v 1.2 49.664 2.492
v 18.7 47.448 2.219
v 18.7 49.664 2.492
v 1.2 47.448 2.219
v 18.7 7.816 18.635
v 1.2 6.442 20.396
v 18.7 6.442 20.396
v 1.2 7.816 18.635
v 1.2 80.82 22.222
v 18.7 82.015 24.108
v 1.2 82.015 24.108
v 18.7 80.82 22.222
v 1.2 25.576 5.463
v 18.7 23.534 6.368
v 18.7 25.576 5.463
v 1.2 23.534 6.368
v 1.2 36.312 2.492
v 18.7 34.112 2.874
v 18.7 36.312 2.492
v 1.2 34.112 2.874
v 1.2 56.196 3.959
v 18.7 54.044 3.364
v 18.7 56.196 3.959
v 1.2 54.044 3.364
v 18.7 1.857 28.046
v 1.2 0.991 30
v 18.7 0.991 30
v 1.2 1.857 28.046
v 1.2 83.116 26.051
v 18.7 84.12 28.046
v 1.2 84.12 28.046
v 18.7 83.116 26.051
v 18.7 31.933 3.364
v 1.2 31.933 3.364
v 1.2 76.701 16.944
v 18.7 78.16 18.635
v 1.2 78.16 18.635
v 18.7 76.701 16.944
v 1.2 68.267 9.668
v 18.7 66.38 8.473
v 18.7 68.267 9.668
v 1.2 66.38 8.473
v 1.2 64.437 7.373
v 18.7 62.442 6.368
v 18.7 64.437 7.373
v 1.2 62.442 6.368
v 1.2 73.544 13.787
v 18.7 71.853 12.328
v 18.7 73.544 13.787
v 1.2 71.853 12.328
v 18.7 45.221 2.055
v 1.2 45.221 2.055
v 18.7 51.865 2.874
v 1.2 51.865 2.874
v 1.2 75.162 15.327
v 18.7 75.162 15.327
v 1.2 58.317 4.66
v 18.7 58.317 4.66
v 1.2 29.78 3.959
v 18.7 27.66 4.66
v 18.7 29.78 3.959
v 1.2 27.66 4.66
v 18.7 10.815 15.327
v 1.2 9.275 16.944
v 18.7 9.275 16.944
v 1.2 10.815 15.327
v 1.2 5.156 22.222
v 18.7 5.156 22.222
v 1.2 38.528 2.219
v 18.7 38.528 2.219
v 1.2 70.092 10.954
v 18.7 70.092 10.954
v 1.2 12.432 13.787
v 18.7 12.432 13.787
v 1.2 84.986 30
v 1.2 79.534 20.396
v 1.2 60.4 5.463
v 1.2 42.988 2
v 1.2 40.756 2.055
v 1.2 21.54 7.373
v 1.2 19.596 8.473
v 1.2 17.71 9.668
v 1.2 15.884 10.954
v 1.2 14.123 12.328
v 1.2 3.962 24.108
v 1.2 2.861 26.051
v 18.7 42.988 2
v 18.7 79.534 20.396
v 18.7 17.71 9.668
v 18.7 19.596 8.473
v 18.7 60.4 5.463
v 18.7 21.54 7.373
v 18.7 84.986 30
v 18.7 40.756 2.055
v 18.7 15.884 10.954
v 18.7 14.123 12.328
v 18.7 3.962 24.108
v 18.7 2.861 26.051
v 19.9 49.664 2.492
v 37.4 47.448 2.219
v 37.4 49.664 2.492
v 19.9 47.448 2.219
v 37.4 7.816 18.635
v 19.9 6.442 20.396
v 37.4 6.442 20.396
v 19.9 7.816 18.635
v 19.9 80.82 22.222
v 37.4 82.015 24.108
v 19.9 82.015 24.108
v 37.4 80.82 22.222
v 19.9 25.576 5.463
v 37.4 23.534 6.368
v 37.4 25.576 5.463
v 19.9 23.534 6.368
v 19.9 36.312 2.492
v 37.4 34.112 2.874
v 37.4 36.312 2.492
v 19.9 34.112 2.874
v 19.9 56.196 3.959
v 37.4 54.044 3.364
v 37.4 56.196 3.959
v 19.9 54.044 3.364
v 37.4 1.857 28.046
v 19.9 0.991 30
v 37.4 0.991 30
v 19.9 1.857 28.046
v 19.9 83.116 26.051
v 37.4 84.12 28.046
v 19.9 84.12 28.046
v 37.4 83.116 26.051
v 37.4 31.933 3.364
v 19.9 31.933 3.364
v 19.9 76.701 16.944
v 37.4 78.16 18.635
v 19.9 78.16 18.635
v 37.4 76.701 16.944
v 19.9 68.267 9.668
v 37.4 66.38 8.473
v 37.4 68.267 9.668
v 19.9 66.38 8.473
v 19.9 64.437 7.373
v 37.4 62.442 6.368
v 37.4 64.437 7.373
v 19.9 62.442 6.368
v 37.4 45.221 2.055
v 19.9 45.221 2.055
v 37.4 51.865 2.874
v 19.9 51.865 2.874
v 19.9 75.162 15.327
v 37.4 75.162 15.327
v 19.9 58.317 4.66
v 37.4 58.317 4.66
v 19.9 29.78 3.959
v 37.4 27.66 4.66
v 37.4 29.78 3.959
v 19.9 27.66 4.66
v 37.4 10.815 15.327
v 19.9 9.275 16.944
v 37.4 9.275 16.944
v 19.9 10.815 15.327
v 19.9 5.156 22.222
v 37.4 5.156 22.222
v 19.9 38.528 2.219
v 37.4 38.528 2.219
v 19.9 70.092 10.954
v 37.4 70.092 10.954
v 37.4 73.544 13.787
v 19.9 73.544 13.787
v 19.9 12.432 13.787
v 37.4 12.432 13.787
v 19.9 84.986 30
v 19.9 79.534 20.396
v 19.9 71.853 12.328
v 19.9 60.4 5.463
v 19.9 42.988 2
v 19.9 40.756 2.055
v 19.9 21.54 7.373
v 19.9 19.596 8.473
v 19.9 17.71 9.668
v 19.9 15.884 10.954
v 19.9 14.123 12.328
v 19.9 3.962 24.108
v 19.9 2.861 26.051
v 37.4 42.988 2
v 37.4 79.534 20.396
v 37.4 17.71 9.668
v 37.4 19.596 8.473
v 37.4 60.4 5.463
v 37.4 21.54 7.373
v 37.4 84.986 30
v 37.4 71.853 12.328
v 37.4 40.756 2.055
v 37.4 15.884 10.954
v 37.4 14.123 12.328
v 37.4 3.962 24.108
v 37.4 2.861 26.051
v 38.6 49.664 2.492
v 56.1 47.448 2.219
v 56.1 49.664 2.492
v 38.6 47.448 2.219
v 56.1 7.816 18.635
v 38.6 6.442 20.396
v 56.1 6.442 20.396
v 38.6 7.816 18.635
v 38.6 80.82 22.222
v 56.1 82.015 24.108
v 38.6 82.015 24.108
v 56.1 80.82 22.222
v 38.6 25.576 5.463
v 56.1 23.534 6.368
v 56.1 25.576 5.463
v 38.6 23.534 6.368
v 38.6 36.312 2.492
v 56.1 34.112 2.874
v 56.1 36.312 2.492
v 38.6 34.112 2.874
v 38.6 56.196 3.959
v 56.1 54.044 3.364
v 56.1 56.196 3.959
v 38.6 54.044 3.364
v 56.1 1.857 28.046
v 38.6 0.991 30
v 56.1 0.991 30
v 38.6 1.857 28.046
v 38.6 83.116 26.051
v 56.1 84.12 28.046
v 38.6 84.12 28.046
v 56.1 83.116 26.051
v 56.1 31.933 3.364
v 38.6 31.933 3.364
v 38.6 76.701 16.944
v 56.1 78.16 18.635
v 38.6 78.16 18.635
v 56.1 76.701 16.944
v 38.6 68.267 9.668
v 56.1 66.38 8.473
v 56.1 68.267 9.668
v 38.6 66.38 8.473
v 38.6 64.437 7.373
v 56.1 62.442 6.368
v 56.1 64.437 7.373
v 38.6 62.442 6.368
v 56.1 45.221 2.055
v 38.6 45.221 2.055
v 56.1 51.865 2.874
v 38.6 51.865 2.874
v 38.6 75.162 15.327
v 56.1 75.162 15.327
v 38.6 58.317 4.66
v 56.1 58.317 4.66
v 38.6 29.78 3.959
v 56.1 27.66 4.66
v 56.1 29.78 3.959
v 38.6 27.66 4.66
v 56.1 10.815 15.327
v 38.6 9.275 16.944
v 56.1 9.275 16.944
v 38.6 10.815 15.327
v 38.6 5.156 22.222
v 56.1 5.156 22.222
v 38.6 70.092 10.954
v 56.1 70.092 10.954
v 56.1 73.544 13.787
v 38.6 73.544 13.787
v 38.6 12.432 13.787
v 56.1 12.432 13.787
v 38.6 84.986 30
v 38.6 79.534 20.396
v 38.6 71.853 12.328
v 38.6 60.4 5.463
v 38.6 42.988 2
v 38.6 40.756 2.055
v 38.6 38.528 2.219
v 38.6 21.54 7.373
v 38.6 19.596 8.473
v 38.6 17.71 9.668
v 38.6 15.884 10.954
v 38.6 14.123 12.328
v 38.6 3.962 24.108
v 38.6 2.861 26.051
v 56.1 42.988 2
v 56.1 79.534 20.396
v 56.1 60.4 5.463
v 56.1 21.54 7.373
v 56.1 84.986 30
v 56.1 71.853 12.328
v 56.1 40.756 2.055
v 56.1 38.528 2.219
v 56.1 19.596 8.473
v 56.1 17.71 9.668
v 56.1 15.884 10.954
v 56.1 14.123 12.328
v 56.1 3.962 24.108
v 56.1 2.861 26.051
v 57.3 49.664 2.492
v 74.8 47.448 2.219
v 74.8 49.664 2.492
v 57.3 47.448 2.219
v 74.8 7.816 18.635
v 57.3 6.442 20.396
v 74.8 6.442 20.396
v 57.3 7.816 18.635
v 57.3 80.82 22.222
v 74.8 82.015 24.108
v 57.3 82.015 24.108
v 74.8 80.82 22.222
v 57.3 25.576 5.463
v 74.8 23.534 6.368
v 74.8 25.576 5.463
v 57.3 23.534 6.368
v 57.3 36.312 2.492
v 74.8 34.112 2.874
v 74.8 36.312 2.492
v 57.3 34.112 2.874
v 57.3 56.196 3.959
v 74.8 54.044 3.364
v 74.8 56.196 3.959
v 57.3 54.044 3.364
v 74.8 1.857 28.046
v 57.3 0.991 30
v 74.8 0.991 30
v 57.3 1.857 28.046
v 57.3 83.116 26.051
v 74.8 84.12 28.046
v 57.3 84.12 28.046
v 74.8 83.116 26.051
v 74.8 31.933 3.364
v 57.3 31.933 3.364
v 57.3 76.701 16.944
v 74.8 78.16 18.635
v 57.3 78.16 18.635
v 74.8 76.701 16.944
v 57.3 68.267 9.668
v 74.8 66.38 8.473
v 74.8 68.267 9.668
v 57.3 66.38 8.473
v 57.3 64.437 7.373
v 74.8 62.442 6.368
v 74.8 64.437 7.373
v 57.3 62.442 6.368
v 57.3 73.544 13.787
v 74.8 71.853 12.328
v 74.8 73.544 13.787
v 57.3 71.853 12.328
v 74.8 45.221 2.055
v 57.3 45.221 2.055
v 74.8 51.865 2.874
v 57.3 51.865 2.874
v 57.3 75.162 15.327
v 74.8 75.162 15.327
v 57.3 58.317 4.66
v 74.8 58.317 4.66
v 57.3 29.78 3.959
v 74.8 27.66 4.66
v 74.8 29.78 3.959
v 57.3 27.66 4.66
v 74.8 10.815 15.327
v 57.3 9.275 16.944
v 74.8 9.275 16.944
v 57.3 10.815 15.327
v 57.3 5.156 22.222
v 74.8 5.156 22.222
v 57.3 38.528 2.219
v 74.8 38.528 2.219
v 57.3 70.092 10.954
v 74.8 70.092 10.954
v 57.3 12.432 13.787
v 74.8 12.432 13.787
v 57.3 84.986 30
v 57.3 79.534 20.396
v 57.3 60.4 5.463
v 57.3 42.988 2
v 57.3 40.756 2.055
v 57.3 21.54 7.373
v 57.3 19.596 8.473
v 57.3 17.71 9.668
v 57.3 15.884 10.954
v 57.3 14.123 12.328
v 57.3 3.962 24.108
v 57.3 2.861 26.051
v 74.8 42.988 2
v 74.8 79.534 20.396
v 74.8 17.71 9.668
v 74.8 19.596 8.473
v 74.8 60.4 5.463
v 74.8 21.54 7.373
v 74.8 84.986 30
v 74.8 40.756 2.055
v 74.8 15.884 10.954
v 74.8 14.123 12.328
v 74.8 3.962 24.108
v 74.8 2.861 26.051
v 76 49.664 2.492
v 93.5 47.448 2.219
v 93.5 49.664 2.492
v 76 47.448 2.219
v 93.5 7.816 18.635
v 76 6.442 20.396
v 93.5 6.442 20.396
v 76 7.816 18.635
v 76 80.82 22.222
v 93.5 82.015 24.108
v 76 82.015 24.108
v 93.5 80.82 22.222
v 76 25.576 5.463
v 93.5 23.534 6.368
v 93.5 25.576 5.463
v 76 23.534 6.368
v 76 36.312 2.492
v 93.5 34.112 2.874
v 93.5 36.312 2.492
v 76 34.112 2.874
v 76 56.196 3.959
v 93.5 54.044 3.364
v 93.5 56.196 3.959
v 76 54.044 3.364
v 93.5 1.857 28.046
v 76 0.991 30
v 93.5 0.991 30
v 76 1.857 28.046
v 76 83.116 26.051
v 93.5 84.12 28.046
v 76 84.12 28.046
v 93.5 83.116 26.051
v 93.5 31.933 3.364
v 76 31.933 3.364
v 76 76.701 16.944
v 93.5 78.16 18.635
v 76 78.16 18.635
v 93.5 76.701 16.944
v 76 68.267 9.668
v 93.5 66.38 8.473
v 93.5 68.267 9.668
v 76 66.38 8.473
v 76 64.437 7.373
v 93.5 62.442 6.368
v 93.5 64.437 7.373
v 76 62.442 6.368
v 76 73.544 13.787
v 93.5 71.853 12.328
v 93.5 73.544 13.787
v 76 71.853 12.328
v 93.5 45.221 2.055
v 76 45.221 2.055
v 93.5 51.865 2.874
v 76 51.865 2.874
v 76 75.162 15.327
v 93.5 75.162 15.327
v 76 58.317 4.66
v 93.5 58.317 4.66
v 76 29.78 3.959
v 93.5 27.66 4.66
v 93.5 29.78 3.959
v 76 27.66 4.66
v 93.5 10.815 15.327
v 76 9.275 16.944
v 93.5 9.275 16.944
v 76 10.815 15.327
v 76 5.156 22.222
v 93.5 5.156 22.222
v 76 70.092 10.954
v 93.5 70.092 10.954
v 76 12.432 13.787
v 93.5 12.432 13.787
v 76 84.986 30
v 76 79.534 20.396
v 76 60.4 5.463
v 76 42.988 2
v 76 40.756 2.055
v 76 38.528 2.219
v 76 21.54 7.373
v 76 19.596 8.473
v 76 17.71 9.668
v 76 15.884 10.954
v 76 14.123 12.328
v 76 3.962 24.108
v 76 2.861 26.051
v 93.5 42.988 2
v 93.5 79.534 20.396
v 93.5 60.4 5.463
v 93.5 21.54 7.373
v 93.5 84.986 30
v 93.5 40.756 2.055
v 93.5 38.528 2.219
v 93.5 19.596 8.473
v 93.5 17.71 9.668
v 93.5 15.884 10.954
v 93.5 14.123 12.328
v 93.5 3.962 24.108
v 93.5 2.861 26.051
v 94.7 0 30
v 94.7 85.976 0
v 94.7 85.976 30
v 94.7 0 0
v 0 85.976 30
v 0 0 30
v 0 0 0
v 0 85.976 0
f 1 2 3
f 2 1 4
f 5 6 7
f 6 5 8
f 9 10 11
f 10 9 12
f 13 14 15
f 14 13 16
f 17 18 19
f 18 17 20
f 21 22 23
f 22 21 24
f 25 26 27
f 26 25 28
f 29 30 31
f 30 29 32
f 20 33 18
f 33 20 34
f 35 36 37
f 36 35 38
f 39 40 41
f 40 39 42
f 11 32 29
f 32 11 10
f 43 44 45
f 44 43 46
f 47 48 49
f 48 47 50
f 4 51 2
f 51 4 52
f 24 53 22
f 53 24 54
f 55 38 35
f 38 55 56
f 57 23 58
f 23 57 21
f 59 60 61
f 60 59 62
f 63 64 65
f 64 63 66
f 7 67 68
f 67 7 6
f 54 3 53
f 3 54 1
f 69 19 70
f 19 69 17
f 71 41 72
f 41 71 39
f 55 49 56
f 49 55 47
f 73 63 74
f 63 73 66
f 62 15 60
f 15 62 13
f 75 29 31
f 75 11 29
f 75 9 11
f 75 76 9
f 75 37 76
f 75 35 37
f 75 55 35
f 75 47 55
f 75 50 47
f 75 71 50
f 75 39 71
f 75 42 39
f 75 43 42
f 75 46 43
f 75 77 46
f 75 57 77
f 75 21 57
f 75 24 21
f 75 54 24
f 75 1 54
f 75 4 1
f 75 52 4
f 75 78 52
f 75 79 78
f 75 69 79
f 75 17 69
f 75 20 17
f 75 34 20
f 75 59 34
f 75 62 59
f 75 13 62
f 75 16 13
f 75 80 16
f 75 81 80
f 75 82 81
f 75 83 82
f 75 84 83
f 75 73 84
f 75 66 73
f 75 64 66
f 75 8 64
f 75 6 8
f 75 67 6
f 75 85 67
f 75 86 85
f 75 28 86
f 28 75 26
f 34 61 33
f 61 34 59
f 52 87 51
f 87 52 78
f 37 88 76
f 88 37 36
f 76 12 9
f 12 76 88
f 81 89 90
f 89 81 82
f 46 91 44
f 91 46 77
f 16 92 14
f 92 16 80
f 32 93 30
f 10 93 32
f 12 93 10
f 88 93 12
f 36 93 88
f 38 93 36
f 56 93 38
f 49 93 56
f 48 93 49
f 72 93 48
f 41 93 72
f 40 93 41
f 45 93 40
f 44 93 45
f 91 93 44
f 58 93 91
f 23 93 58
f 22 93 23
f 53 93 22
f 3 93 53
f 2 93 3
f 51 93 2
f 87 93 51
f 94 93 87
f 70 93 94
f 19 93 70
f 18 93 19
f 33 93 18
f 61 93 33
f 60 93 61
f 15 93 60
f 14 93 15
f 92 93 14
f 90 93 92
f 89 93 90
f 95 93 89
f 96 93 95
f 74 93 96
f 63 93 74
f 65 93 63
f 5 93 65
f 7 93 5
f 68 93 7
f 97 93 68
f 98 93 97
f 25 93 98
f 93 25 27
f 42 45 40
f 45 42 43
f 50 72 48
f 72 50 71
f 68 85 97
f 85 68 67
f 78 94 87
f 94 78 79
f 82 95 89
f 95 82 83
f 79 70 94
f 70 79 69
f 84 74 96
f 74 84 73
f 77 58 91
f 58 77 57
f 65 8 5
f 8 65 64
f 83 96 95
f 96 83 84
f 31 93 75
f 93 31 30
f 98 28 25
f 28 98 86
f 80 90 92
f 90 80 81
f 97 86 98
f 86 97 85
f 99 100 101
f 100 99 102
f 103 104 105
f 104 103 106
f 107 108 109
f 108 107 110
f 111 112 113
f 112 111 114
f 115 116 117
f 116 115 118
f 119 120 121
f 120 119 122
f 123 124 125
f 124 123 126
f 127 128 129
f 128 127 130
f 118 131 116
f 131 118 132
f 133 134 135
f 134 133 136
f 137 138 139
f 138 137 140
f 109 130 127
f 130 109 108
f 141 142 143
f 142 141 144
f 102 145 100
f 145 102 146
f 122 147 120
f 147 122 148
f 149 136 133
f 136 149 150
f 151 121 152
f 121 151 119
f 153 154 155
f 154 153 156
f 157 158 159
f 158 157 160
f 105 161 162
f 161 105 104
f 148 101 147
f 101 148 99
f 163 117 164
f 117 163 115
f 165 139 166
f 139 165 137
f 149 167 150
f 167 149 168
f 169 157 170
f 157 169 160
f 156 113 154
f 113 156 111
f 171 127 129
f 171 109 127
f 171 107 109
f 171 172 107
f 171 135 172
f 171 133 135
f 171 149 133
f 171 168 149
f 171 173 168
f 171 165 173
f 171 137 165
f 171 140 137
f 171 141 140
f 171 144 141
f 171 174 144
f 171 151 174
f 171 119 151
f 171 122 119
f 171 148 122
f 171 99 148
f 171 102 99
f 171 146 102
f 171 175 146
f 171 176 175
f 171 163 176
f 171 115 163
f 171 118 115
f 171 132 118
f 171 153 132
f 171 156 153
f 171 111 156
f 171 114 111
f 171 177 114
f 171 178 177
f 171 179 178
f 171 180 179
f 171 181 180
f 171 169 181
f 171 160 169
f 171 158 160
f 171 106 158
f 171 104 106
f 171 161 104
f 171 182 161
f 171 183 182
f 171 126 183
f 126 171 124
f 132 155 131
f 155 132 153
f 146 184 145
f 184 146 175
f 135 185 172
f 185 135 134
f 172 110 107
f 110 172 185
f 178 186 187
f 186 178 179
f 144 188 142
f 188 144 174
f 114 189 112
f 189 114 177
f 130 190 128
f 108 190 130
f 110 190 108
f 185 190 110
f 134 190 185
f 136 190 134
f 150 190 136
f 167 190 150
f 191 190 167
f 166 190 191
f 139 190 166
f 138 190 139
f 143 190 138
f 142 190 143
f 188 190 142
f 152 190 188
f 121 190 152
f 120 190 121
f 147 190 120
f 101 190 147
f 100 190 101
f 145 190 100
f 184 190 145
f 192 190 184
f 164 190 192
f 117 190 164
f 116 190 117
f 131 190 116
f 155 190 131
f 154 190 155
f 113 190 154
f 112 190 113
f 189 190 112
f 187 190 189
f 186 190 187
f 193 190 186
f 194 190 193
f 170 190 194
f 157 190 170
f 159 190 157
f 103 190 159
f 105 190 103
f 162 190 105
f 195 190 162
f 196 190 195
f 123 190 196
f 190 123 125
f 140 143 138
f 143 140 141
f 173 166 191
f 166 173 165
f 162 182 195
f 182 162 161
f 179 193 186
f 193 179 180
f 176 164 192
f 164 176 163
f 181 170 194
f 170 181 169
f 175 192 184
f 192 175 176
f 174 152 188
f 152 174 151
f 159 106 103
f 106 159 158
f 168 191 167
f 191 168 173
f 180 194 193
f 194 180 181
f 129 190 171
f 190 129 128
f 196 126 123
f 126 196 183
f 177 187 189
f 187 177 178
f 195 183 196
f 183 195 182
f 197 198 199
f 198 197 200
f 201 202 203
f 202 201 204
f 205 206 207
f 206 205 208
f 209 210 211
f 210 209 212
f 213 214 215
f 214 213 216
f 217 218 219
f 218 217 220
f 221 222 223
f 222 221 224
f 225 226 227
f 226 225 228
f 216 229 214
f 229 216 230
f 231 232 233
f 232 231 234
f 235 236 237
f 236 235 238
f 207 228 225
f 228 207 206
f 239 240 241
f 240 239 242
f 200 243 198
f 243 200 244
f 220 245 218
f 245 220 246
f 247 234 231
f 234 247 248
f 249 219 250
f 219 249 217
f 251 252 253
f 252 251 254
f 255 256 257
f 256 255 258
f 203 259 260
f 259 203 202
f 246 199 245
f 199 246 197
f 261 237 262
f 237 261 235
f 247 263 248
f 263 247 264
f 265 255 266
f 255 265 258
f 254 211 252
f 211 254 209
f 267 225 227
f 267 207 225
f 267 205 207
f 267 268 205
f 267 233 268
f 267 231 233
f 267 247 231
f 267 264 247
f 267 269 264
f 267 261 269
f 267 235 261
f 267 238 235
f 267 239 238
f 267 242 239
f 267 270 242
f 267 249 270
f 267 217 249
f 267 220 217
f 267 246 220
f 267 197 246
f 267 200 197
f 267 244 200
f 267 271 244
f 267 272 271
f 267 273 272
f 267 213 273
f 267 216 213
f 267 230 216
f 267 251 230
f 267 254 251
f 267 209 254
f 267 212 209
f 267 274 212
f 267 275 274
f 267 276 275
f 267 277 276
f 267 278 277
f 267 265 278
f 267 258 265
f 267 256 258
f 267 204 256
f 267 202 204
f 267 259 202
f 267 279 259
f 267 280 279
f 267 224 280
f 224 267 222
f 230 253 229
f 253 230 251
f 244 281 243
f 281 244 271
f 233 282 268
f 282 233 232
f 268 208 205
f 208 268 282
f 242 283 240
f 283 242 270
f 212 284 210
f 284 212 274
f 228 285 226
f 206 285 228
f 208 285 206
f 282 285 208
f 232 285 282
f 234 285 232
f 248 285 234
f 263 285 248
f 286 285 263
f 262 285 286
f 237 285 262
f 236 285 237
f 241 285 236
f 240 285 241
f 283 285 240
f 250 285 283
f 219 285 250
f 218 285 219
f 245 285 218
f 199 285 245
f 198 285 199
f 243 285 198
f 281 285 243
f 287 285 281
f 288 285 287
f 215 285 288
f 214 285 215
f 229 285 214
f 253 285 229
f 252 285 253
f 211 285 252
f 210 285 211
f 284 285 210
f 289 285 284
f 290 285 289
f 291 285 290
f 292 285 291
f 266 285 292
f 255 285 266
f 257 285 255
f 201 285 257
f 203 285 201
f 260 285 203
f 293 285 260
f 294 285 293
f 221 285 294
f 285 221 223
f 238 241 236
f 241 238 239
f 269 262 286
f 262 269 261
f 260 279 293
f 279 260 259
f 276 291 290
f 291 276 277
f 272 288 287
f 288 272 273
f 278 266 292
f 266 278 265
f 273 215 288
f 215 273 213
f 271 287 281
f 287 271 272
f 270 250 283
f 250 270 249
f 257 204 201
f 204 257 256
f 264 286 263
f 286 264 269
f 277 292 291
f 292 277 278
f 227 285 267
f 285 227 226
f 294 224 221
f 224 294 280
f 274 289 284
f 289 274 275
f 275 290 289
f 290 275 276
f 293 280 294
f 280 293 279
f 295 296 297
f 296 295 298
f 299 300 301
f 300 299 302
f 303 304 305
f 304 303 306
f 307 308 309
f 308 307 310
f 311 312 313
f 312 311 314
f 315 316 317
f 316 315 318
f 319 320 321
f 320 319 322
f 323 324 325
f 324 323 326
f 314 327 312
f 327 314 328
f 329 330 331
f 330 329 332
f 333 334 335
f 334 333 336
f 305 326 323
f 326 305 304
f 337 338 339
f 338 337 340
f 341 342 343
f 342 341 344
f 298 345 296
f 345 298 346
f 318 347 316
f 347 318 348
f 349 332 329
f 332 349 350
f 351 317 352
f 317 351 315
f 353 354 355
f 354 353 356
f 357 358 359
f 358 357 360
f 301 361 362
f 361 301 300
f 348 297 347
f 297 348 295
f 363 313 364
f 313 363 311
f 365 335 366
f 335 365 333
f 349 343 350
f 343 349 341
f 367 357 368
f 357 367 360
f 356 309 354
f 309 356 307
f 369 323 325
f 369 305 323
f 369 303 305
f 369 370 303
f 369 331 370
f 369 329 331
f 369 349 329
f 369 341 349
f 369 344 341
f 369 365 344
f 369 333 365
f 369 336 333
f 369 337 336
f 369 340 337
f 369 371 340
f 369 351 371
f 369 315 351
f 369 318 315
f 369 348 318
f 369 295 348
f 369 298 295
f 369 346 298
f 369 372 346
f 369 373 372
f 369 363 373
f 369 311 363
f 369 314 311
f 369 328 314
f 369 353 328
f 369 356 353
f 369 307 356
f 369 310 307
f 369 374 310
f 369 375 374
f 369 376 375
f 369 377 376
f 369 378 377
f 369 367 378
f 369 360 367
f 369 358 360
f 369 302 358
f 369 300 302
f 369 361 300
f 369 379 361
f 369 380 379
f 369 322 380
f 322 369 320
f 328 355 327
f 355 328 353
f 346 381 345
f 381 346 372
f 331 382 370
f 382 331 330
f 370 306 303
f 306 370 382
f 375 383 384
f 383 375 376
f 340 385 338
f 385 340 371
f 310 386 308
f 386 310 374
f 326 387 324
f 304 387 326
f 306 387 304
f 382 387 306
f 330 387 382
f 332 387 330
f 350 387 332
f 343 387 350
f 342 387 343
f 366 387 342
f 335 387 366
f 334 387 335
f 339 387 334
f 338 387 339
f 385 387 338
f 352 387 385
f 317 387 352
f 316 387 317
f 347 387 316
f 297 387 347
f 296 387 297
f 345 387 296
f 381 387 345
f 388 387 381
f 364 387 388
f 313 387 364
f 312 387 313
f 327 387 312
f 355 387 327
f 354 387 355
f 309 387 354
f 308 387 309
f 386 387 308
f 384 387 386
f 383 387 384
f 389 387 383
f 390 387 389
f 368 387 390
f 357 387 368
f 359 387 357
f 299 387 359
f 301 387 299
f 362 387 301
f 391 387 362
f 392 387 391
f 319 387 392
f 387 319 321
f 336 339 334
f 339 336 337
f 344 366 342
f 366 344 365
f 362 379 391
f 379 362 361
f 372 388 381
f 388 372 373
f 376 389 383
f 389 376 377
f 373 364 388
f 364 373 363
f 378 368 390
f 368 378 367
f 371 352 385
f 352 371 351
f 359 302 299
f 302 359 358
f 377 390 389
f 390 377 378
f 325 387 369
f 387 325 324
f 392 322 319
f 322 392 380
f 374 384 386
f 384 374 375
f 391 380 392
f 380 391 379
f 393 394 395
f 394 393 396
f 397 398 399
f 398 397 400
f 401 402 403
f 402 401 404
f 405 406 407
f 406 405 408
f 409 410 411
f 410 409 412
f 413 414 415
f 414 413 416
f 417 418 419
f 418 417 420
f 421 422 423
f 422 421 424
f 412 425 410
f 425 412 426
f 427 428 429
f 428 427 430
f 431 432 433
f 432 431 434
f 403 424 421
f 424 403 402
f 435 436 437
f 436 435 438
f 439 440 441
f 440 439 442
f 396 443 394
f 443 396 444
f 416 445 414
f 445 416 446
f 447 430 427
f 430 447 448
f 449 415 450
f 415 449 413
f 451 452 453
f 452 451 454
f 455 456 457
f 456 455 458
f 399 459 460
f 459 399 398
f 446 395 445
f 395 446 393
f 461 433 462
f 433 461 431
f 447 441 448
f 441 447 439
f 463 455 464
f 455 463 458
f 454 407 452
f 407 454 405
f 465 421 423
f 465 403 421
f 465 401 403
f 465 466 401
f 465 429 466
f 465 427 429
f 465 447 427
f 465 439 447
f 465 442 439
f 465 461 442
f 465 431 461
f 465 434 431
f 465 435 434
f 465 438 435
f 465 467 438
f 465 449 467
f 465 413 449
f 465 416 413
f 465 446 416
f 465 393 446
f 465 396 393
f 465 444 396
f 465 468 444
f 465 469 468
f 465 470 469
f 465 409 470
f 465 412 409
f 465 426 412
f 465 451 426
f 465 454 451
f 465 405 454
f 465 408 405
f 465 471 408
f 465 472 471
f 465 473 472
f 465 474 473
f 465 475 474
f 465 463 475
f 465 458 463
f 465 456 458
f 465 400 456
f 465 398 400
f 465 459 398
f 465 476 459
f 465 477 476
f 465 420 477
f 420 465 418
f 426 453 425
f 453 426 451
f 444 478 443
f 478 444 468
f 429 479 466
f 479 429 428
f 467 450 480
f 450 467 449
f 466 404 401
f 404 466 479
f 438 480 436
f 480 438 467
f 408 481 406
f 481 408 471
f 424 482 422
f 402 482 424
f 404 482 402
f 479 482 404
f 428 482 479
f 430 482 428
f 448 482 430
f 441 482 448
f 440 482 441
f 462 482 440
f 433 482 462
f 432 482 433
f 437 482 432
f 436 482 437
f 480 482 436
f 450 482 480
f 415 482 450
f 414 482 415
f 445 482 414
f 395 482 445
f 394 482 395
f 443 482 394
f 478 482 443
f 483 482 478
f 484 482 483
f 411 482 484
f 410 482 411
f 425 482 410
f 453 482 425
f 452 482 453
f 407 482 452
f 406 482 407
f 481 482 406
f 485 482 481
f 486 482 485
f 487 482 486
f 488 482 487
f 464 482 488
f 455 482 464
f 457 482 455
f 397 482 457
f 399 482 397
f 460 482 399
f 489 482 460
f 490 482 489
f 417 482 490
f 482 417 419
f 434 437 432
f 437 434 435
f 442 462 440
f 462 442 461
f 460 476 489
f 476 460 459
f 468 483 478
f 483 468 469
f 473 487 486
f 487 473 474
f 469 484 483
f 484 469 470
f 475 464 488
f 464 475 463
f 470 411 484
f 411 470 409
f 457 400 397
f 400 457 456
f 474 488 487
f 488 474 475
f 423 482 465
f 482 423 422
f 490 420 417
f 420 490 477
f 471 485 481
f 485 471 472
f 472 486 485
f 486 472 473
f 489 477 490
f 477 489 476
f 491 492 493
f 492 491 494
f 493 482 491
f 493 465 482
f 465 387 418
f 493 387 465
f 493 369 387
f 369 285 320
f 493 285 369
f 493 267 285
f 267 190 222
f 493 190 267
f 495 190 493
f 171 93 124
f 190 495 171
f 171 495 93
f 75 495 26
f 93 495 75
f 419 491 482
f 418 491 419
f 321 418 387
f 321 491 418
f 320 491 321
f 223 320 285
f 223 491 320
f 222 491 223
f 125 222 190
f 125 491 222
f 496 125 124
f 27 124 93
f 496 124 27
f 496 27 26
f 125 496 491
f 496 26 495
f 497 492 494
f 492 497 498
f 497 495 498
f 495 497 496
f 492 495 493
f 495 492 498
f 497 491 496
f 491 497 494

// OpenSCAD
spoolDiameter = 90;
spoolWidth = 16.5;
spoolCount = 5;
seperatorWidth = 1.2;
standHeight = 30;
bottomThickness = 2;
gap = 0.5;
$fn = 128;

/*
 * derived values
 */
baseCutoutHeight = standHeight - bottomThickness - gap;
spoolChordSegmentAtStandHeight = 2 * sqrt(2 * (spoolDiameter/2 + gap) * baseCutoutHeight - pow(baseCutoutHeight, 2));
baseWidth = spoolChordSegmentAtStandHeight + 2 * seperatorWidth;
baseLength = spoolCount * (seperatorWidth + spoolWidth + 2 * gap) + seperatorWidth;

module spoolStand() {
    difference() {
        cube([baseLength, baseWidth, standHeight]);
        translate([seperatorWidth, 0, bottomThickness]) color("Silver") {
            for(i = [0 : spoolCount - 1]) {
                translate([i * (2 * gap + spoolWidth + seperatorWidth), 0, 0]) {
                    translate([0, baseWidth/2, spoolDiameter/2 + gap])
                    rotate([90, 0, 90]) 
                        cylinder(d = spoolDiameter + 2 * gap, h = spoolWidth + 2 * gap);
                } 
            }
        }
    }
}

spoolStand();
